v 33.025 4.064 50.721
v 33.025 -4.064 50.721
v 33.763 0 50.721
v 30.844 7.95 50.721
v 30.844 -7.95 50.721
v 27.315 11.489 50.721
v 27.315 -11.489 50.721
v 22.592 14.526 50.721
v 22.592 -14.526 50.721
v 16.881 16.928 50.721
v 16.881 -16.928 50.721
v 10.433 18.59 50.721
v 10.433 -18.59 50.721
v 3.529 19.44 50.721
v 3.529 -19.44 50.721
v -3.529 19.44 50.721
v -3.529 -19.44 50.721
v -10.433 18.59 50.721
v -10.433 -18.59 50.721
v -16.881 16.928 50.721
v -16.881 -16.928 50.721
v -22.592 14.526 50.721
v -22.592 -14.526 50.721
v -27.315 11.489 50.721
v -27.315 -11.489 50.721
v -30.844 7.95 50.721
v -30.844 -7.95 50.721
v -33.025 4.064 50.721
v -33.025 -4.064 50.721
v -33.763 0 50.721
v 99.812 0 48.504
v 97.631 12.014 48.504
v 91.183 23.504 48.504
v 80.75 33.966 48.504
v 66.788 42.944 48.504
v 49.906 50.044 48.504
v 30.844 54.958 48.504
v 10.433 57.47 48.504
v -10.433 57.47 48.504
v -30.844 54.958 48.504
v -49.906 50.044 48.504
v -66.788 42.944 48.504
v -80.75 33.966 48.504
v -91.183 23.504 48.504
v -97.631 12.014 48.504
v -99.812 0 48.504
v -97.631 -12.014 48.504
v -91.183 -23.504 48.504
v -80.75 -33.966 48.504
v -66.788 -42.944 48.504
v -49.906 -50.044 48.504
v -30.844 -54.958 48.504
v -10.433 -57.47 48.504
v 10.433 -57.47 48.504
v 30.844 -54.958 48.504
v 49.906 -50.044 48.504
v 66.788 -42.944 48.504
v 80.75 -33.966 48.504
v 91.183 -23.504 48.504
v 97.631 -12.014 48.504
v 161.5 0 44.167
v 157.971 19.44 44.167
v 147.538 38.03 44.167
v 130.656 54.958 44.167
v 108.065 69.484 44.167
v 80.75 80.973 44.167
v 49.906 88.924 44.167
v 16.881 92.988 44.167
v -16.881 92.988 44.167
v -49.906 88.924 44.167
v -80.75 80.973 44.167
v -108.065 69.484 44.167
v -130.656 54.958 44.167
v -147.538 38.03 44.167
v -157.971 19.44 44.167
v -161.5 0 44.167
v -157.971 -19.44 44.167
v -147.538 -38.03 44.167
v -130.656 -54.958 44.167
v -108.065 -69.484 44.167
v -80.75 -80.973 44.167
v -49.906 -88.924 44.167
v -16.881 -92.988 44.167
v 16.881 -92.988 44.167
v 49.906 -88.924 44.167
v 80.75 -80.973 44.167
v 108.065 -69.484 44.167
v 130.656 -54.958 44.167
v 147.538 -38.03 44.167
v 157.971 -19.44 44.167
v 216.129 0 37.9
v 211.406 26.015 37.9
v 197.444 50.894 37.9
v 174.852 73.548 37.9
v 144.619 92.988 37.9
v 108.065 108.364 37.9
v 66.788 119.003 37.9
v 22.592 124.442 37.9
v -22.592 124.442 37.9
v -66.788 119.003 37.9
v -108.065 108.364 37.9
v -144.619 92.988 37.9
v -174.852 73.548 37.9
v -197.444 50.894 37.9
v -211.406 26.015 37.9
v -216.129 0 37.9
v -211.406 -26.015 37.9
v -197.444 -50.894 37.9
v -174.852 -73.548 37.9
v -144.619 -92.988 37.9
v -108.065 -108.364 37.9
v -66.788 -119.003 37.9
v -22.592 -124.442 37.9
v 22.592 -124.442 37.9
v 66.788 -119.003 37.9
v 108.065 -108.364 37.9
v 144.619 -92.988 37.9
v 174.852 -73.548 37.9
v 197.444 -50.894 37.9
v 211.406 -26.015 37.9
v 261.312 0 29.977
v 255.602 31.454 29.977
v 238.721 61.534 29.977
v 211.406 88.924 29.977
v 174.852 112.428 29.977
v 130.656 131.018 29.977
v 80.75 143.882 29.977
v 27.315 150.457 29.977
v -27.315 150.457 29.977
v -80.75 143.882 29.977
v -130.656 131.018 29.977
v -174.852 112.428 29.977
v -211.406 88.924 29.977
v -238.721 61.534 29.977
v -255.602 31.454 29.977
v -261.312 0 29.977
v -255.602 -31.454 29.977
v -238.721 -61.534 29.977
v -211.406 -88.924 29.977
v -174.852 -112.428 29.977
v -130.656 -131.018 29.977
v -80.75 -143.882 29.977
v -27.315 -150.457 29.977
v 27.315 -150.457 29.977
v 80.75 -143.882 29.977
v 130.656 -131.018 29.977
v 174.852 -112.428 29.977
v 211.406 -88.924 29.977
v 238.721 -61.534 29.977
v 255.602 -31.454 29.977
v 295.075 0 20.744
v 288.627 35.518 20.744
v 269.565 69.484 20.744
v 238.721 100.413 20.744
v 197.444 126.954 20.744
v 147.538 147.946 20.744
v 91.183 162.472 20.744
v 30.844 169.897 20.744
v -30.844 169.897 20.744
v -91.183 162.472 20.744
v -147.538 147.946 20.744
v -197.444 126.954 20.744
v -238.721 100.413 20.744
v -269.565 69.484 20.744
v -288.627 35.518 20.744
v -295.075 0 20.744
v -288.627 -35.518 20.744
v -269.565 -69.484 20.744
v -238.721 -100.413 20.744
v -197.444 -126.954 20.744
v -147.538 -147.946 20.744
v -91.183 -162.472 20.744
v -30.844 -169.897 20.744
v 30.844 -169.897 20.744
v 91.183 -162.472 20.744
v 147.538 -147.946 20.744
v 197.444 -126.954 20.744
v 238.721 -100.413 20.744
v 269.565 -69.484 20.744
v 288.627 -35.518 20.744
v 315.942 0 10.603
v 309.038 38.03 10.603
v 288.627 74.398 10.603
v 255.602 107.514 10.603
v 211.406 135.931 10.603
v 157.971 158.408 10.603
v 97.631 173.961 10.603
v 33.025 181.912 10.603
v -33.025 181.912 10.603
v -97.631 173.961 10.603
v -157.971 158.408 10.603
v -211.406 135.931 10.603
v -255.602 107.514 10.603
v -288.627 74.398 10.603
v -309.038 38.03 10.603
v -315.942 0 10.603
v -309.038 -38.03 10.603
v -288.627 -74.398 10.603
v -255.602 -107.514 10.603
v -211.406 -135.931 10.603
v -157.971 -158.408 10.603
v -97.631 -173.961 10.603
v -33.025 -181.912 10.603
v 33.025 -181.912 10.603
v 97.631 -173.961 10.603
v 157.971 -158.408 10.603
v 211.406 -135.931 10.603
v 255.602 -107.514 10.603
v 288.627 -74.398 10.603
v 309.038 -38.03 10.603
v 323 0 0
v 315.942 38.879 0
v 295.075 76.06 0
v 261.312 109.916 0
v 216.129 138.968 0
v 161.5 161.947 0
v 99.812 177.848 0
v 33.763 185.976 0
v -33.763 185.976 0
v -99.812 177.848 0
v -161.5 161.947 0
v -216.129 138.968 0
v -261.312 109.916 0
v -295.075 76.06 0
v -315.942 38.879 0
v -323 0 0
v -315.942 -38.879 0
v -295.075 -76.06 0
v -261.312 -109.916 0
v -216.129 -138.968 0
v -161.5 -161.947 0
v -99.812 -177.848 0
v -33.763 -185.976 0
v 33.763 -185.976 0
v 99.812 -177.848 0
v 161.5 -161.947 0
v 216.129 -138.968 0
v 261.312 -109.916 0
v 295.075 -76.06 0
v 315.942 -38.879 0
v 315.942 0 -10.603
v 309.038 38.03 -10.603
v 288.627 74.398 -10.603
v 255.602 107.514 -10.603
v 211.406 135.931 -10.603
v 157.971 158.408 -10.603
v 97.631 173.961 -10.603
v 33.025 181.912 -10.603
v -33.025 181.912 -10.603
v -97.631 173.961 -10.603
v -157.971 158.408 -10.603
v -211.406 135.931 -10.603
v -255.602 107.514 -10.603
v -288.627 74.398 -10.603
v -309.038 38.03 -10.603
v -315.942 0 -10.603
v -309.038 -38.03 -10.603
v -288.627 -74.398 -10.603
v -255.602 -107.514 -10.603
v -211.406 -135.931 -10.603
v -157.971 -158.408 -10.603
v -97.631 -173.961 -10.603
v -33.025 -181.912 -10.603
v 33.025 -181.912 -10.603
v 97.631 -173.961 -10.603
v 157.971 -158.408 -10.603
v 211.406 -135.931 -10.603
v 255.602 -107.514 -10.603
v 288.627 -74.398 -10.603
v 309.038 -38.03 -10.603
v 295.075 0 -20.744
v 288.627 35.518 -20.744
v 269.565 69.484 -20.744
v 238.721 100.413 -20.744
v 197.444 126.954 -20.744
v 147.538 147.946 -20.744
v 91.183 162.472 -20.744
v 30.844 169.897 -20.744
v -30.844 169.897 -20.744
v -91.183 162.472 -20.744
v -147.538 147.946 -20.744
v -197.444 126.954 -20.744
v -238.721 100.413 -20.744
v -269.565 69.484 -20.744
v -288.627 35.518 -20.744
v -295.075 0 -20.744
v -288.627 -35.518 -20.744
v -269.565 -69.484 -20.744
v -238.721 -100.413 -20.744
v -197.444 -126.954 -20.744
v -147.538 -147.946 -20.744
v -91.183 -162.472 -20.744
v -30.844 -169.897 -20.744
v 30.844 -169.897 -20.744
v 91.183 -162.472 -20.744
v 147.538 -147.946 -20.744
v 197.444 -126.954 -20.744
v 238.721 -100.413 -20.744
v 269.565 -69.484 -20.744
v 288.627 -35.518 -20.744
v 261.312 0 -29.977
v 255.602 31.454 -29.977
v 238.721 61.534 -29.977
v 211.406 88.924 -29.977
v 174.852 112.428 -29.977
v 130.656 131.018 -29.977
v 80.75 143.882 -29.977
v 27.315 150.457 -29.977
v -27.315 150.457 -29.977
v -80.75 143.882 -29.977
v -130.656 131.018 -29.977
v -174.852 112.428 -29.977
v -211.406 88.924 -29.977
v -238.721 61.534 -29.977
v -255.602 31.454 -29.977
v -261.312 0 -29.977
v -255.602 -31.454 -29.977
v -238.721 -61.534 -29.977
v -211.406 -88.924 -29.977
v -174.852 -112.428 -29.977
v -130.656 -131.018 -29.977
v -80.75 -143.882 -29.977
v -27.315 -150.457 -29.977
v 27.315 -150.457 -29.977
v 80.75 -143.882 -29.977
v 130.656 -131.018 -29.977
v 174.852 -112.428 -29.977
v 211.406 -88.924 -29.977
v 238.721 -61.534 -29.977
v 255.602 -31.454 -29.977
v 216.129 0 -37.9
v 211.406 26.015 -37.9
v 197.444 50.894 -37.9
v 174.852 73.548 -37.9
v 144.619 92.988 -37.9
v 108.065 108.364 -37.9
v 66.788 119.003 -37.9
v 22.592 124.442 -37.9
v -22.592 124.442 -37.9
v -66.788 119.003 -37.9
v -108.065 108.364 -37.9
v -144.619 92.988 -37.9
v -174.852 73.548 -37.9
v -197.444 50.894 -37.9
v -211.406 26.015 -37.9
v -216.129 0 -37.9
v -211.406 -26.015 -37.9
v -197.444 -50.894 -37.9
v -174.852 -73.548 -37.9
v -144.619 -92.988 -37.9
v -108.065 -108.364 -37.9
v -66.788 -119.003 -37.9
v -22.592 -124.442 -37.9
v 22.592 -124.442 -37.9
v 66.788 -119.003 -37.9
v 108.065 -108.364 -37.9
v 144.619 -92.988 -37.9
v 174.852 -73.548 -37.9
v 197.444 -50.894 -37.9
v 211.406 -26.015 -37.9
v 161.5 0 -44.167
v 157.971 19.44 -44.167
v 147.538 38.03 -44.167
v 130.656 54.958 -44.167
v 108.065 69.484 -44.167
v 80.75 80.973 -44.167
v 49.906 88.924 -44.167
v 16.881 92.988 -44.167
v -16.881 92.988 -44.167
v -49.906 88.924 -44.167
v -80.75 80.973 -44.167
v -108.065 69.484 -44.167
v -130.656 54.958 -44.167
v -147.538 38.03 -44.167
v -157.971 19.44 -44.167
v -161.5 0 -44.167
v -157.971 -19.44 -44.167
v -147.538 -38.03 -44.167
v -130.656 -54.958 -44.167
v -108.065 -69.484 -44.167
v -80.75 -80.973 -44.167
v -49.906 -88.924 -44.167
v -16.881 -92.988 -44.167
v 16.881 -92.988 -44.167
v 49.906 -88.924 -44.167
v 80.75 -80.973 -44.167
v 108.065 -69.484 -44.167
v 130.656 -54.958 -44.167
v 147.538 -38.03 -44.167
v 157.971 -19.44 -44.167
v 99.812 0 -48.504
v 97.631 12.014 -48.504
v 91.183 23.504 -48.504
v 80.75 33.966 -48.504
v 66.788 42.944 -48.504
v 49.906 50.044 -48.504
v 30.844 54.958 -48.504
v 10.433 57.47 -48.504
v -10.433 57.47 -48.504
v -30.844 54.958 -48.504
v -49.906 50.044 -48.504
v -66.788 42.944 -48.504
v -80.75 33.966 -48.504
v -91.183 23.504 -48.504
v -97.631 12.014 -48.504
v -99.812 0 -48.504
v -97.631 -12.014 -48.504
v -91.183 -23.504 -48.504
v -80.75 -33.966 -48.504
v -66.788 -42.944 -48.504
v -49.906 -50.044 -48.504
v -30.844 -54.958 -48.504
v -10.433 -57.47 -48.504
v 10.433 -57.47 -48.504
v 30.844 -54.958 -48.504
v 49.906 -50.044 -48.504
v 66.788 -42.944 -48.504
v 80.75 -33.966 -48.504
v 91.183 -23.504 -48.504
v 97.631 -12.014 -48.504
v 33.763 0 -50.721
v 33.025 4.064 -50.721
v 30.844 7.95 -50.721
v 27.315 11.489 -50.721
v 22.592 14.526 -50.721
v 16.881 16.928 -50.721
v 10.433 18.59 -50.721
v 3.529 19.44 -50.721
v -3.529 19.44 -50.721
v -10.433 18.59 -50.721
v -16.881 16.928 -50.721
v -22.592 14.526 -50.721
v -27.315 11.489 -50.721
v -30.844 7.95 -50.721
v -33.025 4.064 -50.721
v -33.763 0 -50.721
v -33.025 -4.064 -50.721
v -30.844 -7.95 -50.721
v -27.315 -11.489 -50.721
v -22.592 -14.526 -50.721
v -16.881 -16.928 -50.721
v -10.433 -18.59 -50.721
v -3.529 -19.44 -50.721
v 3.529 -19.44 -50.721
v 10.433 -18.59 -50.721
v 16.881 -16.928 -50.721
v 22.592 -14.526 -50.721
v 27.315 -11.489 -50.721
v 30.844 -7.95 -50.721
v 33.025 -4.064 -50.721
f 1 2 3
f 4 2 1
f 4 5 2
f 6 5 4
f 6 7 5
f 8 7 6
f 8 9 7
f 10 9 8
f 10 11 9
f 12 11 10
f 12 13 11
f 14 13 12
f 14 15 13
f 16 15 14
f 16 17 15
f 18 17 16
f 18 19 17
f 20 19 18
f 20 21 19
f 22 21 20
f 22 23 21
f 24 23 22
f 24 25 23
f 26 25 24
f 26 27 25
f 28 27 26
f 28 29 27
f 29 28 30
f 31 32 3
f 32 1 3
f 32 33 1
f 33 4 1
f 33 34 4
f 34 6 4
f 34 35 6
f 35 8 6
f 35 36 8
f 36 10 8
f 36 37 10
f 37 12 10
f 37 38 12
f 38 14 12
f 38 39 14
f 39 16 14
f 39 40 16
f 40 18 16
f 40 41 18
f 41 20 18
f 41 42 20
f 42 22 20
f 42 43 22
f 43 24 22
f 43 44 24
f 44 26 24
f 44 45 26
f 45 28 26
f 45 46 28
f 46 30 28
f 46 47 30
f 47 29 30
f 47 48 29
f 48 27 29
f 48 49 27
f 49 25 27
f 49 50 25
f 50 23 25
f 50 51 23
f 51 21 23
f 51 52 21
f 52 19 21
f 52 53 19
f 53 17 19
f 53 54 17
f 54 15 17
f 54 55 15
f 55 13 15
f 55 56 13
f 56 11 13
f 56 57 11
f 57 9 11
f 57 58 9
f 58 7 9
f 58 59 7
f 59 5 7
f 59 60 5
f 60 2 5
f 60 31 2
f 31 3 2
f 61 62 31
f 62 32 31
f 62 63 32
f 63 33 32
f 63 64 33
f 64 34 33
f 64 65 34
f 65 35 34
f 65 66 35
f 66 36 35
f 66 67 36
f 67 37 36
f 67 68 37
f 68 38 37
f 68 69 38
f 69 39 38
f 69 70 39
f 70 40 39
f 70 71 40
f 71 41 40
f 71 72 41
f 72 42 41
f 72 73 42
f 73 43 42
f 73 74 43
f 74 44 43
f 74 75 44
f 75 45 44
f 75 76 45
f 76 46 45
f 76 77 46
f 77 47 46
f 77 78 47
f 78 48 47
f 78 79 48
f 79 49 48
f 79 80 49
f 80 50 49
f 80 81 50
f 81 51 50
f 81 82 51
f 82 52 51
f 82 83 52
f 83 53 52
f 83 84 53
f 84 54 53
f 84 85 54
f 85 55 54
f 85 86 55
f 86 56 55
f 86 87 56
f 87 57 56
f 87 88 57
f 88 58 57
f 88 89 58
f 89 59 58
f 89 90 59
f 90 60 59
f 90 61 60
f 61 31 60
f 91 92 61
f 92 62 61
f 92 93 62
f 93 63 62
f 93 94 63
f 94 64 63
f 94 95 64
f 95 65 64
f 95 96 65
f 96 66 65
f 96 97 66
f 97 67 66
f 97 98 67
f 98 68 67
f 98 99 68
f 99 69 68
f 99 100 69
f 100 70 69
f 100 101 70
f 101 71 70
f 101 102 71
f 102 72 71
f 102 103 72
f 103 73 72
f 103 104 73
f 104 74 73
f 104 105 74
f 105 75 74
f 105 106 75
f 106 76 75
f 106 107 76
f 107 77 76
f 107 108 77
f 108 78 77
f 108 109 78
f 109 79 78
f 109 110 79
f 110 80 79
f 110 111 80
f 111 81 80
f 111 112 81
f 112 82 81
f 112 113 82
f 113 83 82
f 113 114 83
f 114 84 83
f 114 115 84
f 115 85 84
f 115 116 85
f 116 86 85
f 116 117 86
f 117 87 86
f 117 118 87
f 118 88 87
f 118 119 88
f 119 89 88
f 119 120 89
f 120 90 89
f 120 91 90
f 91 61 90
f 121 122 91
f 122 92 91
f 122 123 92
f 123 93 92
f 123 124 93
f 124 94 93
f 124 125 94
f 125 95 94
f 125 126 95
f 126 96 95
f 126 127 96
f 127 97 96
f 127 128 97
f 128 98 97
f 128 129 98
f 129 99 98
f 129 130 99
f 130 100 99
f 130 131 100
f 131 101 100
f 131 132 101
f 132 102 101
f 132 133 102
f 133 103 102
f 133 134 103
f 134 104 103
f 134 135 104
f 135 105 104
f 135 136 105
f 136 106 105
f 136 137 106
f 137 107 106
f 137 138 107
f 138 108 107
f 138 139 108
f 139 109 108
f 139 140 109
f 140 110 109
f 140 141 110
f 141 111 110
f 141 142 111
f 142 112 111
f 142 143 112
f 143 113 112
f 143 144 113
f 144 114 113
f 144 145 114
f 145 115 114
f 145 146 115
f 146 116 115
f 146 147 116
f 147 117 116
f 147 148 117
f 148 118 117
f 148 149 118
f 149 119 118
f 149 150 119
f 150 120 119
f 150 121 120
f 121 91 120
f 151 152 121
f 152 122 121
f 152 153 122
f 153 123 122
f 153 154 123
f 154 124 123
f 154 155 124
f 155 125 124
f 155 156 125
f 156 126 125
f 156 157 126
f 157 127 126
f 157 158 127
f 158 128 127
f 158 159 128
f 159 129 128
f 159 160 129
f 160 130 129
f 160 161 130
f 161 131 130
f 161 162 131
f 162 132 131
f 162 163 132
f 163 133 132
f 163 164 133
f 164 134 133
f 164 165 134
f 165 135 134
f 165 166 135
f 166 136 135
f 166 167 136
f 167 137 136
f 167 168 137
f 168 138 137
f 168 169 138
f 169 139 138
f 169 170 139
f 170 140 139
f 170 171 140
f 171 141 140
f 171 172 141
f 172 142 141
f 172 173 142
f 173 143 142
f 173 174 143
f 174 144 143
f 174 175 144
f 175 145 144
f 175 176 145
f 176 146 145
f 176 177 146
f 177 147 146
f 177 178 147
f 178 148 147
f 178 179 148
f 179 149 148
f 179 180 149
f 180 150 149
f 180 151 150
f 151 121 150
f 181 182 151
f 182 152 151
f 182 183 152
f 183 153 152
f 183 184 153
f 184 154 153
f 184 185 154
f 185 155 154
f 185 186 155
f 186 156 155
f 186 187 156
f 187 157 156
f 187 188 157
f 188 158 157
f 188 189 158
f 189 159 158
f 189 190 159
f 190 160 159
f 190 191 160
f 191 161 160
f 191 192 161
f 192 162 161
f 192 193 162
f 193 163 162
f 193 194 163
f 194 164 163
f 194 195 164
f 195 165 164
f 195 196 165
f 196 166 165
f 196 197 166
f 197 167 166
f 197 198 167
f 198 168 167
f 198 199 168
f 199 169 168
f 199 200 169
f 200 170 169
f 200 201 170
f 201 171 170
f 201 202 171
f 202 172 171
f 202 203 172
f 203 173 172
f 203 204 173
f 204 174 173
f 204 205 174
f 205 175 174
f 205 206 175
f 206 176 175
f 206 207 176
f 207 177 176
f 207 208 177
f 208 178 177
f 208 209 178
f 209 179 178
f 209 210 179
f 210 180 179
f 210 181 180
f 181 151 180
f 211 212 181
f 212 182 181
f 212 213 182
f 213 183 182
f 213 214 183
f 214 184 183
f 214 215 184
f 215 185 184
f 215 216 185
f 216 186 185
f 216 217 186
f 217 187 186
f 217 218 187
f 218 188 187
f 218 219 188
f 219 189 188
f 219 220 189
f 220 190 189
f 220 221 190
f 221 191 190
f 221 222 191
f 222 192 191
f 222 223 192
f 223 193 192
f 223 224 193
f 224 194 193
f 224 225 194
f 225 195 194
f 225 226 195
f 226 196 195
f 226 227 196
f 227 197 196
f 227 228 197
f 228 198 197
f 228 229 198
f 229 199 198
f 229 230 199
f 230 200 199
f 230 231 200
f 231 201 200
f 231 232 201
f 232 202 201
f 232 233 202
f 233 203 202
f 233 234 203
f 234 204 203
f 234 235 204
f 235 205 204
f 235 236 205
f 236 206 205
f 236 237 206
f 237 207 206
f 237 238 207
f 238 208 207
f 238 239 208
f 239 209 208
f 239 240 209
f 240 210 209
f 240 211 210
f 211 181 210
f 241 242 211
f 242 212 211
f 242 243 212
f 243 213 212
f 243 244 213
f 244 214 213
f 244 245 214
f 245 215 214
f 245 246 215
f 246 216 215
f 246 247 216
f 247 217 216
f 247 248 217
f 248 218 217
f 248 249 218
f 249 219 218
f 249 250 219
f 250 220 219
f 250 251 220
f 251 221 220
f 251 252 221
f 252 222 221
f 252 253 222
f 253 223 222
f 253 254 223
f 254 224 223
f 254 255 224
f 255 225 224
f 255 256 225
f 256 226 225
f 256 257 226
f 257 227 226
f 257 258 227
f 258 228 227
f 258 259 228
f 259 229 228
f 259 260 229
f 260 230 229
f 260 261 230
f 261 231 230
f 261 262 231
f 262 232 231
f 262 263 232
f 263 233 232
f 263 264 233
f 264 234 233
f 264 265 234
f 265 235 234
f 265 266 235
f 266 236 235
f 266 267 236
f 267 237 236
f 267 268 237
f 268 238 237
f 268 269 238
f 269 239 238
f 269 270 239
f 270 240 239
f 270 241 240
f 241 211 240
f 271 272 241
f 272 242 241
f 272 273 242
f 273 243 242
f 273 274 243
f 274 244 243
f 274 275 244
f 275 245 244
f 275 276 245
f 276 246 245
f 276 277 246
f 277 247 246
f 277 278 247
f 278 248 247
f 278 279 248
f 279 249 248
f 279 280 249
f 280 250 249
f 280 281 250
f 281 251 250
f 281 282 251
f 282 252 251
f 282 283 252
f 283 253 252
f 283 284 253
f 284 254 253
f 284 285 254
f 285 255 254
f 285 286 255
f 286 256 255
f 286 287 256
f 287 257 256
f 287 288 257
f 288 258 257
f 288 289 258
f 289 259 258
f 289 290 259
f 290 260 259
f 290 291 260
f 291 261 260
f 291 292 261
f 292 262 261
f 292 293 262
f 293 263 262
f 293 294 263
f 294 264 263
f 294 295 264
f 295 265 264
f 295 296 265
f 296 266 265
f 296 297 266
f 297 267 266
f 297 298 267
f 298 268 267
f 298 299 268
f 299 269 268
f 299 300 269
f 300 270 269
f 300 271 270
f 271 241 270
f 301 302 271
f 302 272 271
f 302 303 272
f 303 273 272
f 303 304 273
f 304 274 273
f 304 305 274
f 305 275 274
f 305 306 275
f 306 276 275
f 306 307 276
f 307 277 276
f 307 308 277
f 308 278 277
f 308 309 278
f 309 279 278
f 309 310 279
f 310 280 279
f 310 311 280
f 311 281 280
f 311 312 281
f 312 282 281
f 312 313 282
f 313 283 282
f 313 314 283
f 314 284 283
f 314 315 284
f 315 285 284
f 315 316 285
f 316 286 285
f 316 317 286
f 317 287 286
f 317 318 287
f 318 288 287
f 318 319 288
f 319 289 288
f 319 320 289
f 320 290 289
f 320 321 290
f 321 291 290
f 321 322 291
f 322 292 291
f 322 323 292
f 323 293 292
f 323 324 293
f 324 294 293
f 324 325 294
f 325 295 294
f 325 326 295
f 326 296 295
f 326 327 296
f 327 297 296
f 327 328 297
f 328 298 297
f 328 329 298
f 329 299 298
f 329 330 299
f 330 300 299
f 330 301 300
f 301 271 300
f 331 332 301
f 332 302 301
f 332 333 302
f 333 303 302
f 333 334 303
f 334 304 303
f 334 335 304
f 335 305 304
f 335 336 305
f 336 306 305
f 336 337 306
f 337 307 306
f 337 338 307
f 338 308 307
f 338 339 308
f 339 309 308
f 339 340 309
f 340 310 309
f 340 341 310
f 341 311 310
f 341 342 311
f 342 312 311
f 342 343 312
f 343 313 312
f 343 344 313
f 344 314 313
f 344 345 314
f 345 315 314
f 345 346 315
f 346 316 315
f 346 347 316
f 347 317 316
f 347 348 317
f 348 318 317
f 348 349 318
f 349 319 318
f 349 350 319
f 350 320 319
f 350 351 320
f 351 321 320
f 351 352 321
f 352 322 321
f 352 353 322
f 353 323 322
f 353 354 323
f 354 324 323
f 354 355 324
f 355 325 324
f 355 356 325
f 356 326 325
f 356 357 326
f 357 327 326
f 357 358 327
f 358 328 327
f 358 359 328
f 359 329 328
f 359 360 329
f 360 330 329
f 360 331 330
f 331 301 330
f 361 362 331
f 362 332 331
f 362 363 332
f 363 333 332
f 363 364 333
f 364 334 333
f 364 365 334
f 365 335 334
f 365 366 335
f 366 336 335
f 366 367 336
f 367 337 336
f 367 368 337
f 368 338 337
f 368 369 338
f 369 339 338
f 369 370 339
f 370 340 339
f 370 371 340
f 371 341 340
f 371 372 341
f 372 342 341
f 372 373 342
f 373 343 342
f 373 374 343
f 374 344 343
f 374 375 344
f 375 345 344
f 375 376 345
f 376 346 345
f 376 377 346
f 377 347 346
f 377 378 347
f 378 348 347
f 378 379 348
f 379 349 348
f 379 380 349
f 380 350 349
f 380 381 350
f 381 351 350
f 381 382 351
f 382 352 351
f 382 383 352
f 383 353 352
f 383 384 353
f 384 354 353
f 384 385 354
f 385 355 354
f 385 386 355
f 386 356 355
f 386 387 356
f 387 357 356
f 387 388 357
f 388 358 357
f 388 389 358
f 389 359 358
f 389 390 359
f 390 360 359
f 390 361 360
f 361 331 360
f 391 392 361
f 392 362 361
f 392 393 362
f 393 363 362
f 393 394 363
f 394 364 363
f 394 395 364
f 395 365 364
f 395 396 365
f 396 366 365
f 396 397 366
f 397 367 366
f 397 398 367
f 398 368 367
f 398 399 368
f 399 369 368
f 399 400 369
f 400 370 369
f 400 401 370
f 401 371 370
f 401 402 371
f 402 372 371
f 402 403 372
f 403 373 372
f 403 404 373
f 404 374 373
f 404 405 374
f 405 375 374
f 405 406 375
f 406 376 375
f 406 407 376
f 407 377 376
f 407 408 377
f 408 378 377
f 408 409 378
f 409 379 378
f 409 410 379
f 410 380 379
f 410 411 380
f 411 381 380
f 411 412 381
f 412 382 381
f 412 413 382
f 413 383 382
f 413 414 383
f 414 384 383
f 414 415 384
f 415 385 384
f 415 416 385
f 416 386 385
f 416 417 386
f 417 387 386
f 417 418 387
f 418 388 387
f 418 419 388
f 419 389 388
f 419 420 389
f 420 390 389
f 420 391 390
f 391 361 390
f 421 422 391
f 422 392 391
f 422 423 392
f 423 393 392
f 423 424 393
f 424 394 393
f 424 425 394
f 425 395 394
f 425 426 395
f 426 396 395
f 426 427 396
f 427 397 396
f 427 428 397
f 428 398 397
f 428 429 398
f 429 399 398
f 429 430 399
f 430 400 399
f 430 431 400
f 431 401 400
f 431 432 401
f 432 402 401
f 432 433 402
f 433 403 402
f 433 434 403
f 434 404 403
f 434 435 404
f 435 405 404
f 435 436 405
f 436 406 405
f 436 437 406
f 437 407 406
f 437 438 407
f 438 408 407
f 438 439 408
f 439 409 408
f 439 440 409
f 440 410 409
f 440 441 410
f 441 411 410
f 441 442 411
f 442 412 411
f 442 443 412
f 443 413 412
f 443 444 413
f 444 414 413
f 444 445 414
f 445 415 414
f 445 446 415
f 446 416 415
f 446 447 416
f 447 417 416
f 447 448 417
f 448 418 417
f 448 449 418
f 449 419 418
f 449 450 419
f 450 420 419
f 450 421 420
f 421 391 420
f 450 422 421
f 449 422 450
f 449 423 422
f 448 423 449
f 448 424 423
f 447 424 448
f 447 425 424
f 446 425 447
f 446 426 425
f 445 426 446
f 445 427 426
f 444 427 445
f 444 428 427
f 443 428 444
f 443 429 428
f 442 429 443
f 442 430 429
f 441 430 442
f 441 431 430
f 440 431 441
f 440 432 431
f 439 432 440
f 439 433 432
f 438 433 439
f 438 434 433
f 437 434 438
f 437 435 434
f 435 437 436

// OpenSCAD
// Generated by SolidPython 1.0.1 on 2020-07-29 00:46:54


scale(v = [19, 11, 3]) {
	sphere(r = 17);
}
/***********************************************
*********      SolidPython code:      **********
************************************************
 
# import packages: SolidPython
from solid import *
from solid.utils import *
from itertools import chain, combinations, permutations


class Resize:

    def __init__(self, scad_file):
        self.scad_file = scad_file
        #self.scad_file = import_scad(scad_file)
        # cone/cylinder param:
        self.r1 = 0
        self.r2 = 0
        self.h = 0
        # rectangular prism param:
        self.w = 0
        self.l = 0
        # ellipse param:
        self.r = 0

    # import OpenScad code (file name corresponds to shape)


    # classify shape + parameters
    def assign(self, param1, param2, param3):
        if self.scad_file == 'cone.scad':
            self.r1 = param1
            self.r2 = param2
            self.h = param3
        elif self.scad_file == 'cylinder.scad':
            self.r1 = param1
            self.r2 = param2
            self.h = param3
        elif self.scad_file == 'rectangularPrism.scad':
            self.h = param1
            self.l = param2
            self.w = param3
        else:
            self.r = param1
            self.h = param2

    # resize parameters
    def iterate(self):
        x = range(3, 20, 2)
        i = 1
        if self.scad_file == 'cone.scad':
            tempList = list(permutations(x, 2))
            for temp in tempList:
                param1 = temp[0]
                param2 = temp[1]
                filepath = 'produced_scad_files/' + 'cone' + str(param1) + '_' + str(param2) + '_' + '.scad'
                scad_render_to_file(cylinder(h=param1, r1=param2, r2=0), filepath)

        elif self.scad_file == 'cylinder.scad':
            tempList = list(permutations(x, 3))
            for temp in tempList:
                param1 = temp[0]
                param2 = temp[1]
                filepath = 'produced_scad_files/' + 'cylinder' + str(param1) + '_' + str(param2) + '_' + '.scad'
                scad_render_to_file(cylinder(h=param1, r1=param2, r2=param2), filepath)

        elif self.scad_file == 'rectangularPrism.scad':
            tempList = list(permutations(x, 3))
            for temp in tempList:
                param1 = temp[0]
                param2 = temp[1]
                param3 = temp[2]
                filepath = 'produced_scad_files/' + 'rectangularPrism' + str(param1) + '_' + str(param2) + '_' + str(
                    param3) + '.scad'
                scad_render_to_file(cube(size=(param1, param2, param3)), filepath)

        elif self.scad_file == 'ellipse.scad':
            tempList = list(permutations(x, 4))
            for temp in tempList:
                param1 = temp[0]
                param2 = temp[1]
                param3 = temp[2]
                param4 = temp[3]
                filepath = 'produced_scad_files/' + 'ellipse' + str(param1) + '_' + str(param2) + '_' + str(param3) + '_' + str(param4) + '.scad'
                scad_render_to_file(scale([param1, param2, param3])(sphere(r=param4)), filepath)

    def render_to_scadfile(self):
        scad_render_to_file(scad, 'example.scad') 
 
************************************************/
